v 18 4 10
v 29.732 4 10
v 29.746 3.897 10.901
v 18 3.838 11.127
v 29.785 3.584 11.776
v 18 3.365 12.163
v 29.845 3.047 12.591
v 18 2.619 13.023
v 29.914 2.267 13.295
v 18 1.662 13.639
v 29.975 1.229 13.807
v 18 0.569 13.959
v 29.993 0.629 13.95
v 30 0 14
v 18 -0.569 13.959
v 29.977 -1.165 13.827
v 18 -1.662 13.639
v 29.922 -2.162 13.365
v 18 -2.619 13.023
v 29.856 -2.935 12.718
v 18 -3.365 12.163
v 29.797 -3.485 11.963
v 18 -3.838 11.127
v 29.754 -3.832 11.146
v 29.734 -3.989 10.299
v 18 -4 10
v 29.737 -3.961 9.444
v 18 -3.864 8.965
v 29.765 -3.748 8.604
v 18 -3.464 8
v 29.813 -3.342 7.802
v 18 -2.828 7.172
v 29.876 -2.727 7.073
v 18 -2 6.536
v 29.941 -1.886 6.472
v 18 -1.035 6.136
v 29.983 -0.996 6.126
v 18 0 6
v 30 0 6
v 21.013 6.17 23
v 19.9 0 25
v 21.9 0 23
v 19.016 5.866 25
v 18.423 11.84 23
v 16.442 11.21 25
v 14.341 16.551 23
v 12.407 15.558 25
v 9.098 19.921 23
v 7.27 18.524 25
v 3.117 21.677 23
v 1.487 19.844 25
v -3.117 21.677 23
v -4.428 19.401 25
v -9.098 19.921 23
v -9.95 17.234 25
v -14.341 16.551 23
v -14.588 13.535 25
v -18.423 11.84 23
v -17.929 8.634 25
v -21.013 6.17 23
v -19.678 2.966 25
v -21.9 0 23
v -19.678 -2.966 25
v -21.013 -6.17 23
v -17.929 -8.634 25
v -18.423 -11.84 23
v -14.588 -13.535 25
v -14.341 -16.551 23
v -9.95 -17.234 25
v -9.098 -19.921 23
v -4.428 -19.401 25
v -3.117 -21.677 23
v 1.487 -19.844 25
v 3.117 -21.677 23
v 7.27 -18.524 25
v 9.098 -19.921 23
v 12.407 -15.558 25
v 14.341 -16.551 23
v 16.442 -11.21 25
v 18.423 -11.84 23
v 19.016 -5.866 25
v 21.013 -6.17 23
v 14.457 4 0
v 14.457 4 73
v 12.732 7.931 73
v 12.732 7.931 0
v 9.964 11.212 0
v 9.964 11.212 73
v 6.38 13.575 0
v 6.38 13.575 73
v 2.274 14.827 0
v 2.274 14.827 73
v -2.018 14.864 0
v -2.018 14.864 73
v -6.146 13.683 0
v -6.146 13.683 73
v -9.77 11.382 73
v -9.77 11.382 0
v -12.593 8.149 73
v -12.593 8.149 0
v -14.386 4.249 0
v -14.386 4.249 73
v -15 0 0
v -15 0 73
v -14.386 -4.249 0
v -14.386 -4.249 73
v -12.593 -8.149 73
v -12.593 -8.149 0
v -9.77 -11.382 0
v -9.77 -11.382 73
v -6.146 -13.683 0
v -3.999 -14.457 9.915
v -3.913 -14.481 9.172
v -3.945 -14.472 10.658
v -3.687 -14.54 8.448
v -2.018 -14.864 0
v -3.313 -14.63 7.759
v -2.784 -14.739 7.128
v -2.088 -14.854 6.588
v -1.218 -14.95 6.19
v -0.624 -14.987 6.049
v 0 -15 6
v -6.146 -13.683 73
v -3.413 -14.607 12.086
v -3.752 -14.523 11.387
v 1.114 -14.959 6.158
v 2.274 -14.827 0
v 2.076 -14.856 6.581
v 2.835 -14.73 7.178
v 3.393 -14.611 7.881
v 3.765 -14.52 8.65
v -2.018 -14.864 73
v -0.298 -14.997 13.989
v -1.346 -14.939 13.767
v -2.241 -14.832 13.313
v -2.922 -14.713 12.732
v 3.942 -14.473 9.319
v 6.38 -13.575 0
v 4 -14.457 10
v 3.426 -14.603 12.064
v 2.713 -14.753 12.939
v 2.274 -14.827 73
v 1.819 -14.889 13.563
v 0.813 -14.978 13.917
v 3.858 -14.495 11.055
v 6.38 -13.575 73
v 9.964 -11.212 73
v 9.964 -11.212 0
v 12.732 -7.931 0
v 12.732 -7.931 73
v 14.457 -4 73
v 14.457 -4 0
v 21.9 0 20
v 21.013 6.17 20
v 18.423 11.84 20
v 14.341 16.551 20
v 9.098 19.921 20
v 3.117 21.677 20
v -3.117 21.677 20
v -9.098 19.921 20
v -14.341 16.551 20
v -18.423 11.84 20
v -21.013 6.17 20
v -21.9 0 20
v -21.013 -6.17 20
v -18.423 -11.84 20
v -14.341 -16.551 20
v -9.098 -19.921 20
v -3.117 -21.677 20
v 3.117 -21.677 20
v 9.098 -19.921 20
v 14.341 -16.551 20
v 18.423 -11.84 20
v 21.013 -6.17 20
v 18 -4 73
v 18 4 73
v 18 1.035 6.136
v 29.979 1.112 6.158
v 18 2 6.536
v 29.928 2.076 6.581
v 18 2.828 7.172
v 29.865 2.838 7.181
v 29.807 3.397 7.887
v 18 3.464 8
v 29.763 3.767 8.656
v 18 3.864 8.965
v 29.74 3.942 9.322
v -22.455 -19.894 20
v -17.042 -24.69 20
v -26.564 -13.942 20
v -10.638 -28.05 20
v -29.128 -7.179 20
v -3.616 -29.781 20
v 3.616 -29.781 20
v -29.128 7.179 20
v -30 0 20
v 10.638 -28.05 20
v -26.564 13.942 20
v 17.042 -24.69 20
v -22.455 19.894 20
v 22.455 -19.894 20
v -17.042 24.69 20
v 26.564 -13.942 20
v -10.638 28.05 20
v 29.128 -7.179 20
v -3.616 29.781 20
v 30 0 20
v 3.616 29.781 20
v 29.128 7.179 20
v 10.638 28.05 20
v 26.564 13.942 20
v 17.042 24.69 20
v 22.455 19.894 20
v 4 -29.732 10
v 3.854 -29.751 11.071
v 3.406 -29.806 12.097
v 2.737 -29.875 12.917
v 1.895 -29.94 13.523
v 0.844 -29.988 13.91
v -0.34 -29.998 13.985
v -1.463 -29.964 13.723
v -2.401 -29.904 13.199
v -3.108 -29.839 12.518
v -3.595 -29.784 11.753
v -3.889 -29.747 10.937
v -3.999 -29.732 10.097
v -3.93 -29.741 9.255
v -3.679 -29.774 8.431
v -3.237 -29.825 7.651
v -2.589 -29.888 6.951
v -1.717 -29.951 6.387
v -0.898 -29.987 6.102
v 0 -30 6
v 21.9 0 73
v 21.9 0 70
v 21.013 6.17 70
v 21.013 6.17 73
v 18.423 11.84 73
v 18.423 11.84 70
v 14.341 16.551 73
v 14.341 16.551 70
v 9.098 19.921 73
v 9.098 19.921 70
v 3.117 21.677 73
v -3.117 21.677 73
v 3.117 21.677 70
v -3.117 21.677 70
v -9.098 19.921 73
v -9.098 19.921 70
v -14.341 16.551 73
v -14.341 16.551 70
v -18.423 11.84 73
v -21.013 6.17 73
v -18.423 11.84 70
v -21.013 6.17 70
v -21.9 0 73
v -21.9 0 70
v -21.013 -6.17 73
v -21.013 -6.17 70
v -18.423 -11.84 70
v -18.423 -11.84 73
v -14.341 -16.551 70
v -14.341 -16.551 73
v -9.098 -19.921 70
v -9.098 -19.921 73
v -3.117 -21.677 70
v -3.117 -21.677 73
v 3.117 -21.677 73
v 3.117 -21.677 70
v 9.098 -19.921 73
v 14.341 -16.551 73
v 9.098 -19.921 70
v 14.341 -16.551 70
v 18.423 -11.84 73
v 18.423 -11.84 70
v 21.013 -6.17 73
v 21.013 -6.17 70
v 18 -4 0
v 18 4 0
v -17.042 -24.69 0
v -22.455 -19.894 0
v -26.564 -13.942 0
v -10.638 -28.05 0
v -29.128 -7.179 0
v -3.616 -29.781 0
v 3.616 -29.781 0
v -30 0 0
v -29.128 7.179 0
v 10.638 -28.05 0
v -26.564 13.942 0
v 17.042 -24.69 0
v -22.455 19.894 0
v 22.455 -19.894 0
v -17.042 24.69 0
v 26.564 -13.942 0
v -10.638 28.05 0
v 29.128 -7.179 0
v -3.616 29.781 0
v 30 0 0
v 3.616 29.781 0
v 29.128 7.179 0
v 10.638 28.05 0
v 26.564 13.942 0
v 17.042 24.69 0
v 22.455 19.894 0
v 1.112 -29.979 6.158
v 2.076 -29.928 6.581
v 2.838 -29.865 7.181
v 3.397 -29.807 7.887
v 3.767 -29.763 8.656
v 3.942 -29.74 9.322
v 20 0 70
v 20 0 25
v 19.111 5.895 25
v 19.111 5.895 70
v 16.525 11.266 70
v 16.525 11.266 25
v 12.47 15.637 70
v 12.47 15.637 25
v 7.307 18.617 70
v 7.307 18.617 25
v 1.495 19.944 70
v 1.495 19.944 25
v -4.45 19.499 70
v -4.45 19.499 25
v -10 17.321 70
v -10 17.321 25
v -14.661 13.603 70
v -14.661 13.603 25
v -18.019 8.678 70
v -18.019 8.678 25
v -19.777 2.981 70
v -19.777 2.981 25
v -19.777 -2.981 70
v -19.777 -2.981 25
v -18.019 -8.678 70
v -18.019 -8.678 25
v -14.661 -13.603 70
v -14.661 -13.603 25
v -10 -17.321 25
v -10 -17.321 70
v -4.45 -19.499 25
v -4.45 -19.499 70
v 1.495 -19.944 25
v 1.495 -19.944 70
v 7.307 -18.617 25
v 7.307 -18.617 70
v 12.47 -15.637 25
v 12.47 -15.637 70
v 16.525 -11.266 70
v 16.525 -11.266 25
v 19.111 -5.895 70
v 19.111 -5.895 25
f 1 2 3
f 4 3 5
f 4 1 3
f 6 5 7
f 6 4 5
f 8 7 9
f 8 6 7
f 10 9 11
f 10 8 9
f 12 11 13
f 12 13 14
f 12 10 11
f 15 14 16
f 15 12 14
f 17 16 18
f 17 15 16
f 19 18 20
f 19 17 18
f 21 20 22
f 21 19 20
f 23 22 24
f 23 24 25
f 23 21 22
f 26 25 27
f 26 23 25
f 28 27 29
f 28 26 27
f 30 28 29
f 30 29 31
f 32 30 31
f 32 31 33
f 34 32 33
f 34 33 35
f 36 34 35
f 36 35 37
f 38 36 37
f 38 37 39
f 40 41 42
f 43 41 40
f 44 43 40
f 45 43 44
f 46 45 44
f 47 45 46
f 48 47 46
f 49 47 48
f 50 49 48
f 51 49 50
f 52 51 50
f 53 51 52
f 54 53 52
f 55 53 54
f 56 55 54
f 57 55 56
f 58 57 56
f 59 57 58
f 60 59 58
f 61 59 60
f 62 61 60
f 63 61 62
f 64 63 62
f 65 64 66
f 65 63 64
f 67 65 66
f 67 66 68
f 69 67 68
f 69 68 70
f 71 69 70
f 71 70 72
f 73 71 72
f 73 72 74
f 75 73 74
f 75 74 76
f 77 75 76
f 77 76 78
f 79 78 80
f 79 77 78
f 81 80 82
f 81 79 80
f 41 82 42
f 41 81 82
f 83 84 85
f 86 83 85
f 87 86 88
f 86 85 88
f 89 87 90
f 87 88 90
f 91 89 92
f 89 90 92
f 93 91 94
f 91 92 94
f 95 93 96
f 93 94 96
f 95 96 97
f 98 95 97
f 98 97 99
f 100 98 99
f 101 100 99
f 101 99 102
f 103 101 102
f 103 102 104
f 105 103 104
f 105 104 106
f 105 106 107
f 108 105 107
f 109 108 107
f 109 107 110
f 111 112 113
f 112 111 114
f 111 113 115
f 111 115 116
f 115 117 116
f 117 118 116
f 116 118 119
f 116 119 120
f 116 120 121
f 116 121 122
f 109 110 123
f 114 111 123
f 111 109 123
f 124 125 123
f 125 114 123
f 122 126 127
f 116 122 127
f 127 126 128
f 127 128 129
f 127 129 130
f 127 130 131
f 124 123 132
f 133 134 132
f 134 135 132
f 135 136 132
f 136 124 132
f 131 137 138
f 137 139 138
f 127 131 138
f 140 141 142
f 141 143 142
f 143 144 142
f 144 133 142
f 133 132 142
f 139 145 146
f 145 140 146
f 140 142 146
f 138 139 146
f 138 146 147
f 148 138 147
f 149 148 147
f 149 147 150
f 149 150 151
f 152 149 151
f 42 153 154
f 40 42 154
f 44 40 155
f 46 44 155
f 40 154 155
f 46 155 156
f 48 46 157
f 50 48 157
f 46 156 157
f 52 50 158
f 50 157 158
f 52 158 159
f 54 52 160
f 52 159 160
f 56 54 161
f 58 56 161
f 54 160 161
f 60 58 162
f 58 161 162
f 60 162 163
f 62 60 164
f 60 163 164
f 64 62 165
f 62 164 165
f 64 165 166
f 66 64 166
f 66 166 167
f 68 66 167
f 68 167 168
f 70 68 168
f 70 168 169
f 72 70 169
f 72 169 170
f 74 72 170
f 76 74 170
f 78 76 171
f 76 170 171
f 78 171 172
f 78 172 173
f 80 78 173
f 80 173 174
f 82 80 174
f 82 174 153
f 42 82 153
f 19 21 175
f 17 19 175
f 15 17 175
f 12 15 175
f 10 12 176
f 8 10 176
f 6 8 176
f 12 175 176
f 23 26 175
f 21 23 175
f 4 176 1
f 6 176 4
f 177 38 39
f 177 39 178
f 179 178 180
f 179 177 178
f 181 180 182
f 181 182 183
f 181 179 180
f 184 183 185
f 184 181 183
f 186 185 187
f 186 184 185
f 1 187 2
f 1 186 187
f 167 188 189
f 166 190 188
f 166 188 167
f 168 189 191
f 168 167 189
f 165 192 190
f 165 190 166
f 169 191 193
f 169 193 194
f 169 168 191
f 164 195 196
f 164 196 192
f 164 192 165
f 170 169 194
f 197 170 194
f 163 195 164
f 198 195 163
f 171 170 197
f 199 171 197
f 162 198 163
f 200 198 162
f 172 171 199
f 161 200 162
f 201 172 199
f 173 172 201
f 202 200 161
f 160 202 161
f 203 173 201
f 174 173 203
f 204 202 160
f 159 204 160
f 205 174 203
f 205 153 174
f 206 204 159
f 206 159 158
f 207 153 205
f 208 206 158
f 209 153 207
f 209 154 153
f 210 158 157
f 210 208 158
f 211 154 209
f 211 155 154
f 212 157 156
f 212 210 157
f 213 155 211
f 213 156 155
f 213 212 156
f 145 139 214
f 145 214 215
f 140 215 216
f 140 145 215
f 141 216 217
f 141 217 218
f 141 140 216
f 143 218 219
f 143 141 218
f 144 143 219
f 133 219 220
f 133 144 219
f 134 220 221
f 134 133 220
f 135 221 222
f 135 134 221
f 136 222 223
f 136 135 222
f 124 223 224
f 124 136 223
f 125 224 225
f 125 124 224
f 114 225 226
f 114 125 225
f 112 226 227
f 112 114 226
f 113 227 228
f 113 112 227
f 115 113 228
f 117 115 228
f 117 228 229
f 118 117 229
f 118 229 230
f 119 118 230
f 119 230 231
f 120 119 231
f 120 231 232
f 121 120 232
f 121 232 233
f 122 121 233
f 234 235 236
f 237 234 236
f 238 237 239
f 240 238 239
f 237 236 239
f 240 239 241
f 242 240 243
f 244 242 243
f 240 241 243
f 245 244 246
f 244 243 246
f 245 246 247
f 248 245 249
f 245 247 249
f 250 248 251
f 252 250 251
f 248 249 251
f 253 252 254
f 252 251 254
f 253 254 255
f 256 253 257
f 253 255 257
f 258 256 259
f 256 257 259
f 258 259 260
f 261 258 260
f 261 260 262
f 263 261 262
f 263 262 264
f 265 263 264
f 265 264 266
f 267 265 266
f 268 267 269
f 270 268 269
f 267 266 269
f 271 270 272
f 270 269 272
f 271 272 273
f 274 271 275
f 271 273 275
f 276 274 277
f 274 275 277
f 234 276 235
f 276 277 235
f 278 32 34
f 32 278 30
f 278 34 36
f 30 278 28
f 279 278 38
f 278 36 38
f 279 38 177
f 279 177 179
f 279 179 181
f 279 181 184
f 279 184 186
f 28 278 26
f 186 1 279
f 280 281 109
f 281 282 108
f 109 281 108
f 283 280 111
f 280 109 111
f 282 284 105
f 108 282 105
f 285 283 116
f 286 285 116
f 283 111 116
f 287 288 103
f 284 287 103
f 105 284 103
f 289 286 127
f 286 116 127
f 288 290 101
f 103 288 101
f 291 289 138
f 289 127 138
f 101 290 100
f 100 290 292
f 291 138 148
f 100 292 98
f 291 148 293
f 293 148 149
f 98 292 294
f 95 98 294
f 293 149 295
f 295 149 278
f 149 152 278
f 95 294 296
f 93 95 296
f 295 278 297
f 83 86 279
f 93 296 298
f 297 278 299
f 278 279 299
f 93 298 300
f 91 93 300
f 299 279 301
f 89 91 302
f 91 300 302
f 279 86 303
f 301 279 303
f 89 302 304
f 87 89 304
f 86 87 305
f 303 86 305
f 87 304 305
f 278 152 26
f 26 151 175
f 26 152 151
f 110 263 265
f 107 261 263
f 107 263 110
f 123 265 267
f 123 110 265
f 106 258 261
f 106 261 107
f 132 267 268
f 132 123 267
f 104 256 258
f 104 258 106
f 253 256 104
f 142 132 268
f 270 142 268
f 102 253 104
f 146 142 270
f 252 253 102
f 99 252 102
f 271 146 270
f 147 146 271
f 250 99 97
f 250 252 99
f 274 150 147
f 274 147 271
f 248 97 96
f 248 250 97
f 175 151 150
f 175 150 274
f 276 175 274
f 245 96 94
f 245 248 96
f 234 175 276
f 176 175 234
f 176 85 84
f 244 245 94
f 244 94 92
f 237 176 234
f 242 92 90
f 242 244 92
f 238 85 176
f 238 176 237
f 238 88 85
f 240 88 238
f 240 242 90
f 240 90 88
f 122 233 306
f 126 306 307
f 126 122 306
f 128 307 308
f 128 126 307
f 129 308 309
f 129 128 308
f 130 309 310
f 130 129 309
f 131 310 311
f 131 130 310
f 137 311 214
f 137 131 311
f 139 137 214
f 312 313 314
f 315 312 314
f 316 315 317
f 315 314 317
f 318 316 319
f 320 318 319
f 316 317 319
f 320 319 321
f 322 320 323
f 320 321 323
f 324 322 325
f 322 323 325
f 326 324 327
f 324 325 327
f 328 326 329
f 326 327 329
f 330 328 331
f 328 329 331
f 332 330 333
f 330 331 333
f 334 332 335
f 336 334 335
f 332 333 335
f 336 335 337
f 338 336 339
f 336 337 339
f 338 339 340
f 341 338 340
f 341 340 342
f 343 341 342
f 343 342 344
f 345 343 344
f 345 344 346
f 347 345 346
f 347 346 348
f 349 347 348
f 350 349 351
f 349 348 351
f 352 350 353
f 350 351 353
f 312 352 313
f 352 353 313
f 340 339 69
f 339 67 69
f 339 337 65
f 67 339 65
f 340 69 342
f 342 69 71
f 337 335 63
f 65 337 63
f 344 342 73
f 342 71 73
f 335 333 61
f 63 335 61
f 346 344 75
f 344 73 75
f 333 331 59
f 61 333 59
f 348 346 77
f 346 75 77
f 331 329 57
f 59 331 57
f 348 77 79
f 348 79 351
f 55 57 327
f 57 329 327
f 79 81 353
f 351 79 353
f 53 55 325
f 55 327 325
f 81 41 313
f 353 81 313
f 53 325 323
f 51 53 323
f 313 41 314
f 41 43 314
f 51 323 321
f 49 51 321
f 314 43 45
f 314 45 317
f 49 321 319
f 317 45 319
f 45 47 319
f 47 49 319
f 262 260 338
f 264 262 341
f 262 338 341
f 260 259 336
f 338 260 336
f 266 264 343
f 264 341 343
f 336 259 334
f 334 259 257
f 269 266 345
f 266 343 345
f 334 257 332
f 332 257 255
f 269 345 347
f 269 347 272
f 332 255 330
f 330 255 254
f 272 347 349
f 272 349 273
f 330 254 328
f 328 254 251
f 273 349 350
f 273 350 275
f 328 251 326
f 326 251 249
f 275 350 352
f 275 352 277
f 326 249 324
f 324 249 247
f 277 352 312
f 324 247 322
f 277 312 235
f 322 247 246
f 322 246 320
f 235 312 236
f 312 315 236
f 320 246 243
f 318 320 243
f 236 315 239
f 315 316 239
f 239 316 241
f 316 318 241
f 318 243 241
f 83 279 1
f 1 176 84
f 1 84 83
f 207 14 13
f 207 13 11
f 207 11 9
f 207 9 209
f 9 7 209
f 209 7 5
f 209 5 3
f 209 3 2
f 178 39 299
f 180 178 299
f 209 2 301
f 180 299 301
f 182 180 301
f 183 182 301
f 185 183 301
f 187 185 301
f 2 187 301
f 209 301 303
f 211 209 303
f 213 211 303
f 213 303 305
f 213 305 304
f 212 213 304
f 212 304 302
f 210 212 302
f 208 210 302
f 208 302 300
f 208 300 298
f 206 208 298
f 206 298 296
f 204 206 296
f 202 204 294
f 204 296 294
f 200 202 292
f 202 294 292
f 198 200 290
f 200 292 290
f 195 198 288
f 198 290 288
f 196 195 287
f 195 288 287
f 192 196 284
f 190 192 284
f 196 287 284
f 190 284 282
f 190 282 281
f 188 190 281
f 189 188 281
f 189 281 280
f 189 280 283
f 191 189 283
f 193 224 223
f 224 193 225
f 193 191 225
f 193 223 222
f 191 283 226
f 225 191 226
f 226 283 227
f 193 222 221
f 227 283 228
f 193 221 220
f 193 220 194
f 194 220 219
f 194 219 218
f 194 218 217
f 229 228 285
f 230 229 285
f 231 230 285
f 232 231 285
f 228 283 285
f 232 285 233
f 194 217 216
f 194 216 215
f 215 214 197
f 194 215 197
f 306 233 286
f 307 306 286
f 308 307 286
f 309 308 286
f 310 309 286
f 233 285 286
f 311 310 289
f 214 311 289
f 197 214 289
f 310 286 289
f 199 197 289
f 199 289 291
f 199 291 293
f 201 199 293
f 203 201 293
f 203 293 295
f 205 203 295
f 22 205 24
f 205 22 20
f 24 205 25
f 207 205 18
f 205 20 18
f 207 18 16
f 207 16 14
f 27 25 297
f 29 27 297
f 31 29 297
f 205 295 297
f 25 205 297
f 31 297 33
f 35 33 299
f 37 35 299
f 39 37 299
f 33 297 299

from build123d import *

# Parameters (mm, degrees)
F0_R      = 30
F1_DEPTH  = 20
F2_R      = 21.9
F3_DEPTH  = 3
F4_R      = 21.9
F5_DEPTH  = 2
F6_SIZE   = 2
F7_R      = 20
F8_DEPTH  = 45
F9_R      = 21.9
F10_DEPTH = 3
F12_DEPTH = 86.2
F14_DEPTH = 70
F16_DEPTH = 60.5


with BuildPart() as f1:
    # F0 (on Top) → F1 (new body)
    with BuildSketch(Plane.XY):
        Circle(F0_R)
    extrude(amount=F1_DEPTH)

    # F2 (on face) → F3 (join)
    with BuildSketch(Plane.XY.offset(20)):
        Circle(F2_R)
    extrude(amount=F3_DEPTH)

    # F4 (on face) → F5 (join)
    with BuildSketch(Plane.XY.offset(23)):
        Circle(F4_R)
    extrude(amount=F5_DEPTH)

    # F6
    f6_edges = [f1.edges().sort_by_distance(p)[0] for p in [
        (-21.9, 0, 25),
    ]]
    chamfer(f6_edges, length=F6_SIZE)

    # F7 (on face) → F8 (join)
    with BuildSketch(Plane.XY.offset(25)):
        Circle(F7_R)
    extrude(amount=F8_DEPTH)

    # F9 (on face) → F10 (join)
    with BuildSketch(Plane.XY.offset(70)):
        Circle(F9_R)
    extrude(amount=F10_DEPTH)

    # F11 (on face) → F12 (cut)
    with BuildSketch(Plane.XY.offset(73)):
        with BuildLine():
            Line((-15, 0), (15, 0))
            ThreePointArc((15, 0), (14.8635877974, 2.0183552187), (14.4568322948, 4))
            ThreePointArc((14.4568322948, 4), (-2.0183552187, 14.8635877974), (-15, 0))
        make_face()
        with BuildLine():
            Line((18, 0), (15, 0))
            ThreePointArc((15, 0), (14.8635877974, -2.0183552187), (14.4568322948, -4))
            Line((14.4568322948, -4), (18, -4))
            Line((18, -4), (18, 0))
        make_face()
        with BuildLine():
            ThreePointArc((14.4568322948, -4), (14.8635877974, -2.0183552187), (15, 0))
            Line((15, 0), (-15, 0))
            ThreePointArc((-15, 0), (-2.0183552187, -14.8635877974), (14.4568322948, -4))
        make_face()
        with BuildLine():
            ThreePointArc((14.4568322948, 4), (14.8635877974, 2.0183552187), (15, 0))
            Line((15, 0), (18, 0))
            Line((18, 0), (18, 4))
            Line((18, 4), (14.4568322948, 4))
        make_face()
    extrude(amount=-F12_DEPTH, mode=Mode.SUBTRACT)

    # F13 (on Front) → F14 (cut)
    with BuildSketch(Plane.XZ):
        with BuildLine():
            ThreePointArc((0, 6), (2.8284271247, 7.1715728753), (4, 10))
            ThreePointArc((4, 10), (-2.8284271247, 12.8284271247), (0, 6))
        make_face()
    extrude(amount=F14_DEPTH, mode=Mode.SUBTRACT)

    # F15 (on Right) → F16 (cut)
    with BuildSketch(Plane.YZ):
        with BuildLine():
            ThreePointArc((0, 6), (2.8284271247, 7.1715728753), (4, 10))
            ThreePointArc((4, 10), (-2.8284271247, 12.8284271247), (0, 6))
        make_face()
    extrude(amount=F16_DEPTH, mode=Mode.SUBTRACT)


solid = f1.part
